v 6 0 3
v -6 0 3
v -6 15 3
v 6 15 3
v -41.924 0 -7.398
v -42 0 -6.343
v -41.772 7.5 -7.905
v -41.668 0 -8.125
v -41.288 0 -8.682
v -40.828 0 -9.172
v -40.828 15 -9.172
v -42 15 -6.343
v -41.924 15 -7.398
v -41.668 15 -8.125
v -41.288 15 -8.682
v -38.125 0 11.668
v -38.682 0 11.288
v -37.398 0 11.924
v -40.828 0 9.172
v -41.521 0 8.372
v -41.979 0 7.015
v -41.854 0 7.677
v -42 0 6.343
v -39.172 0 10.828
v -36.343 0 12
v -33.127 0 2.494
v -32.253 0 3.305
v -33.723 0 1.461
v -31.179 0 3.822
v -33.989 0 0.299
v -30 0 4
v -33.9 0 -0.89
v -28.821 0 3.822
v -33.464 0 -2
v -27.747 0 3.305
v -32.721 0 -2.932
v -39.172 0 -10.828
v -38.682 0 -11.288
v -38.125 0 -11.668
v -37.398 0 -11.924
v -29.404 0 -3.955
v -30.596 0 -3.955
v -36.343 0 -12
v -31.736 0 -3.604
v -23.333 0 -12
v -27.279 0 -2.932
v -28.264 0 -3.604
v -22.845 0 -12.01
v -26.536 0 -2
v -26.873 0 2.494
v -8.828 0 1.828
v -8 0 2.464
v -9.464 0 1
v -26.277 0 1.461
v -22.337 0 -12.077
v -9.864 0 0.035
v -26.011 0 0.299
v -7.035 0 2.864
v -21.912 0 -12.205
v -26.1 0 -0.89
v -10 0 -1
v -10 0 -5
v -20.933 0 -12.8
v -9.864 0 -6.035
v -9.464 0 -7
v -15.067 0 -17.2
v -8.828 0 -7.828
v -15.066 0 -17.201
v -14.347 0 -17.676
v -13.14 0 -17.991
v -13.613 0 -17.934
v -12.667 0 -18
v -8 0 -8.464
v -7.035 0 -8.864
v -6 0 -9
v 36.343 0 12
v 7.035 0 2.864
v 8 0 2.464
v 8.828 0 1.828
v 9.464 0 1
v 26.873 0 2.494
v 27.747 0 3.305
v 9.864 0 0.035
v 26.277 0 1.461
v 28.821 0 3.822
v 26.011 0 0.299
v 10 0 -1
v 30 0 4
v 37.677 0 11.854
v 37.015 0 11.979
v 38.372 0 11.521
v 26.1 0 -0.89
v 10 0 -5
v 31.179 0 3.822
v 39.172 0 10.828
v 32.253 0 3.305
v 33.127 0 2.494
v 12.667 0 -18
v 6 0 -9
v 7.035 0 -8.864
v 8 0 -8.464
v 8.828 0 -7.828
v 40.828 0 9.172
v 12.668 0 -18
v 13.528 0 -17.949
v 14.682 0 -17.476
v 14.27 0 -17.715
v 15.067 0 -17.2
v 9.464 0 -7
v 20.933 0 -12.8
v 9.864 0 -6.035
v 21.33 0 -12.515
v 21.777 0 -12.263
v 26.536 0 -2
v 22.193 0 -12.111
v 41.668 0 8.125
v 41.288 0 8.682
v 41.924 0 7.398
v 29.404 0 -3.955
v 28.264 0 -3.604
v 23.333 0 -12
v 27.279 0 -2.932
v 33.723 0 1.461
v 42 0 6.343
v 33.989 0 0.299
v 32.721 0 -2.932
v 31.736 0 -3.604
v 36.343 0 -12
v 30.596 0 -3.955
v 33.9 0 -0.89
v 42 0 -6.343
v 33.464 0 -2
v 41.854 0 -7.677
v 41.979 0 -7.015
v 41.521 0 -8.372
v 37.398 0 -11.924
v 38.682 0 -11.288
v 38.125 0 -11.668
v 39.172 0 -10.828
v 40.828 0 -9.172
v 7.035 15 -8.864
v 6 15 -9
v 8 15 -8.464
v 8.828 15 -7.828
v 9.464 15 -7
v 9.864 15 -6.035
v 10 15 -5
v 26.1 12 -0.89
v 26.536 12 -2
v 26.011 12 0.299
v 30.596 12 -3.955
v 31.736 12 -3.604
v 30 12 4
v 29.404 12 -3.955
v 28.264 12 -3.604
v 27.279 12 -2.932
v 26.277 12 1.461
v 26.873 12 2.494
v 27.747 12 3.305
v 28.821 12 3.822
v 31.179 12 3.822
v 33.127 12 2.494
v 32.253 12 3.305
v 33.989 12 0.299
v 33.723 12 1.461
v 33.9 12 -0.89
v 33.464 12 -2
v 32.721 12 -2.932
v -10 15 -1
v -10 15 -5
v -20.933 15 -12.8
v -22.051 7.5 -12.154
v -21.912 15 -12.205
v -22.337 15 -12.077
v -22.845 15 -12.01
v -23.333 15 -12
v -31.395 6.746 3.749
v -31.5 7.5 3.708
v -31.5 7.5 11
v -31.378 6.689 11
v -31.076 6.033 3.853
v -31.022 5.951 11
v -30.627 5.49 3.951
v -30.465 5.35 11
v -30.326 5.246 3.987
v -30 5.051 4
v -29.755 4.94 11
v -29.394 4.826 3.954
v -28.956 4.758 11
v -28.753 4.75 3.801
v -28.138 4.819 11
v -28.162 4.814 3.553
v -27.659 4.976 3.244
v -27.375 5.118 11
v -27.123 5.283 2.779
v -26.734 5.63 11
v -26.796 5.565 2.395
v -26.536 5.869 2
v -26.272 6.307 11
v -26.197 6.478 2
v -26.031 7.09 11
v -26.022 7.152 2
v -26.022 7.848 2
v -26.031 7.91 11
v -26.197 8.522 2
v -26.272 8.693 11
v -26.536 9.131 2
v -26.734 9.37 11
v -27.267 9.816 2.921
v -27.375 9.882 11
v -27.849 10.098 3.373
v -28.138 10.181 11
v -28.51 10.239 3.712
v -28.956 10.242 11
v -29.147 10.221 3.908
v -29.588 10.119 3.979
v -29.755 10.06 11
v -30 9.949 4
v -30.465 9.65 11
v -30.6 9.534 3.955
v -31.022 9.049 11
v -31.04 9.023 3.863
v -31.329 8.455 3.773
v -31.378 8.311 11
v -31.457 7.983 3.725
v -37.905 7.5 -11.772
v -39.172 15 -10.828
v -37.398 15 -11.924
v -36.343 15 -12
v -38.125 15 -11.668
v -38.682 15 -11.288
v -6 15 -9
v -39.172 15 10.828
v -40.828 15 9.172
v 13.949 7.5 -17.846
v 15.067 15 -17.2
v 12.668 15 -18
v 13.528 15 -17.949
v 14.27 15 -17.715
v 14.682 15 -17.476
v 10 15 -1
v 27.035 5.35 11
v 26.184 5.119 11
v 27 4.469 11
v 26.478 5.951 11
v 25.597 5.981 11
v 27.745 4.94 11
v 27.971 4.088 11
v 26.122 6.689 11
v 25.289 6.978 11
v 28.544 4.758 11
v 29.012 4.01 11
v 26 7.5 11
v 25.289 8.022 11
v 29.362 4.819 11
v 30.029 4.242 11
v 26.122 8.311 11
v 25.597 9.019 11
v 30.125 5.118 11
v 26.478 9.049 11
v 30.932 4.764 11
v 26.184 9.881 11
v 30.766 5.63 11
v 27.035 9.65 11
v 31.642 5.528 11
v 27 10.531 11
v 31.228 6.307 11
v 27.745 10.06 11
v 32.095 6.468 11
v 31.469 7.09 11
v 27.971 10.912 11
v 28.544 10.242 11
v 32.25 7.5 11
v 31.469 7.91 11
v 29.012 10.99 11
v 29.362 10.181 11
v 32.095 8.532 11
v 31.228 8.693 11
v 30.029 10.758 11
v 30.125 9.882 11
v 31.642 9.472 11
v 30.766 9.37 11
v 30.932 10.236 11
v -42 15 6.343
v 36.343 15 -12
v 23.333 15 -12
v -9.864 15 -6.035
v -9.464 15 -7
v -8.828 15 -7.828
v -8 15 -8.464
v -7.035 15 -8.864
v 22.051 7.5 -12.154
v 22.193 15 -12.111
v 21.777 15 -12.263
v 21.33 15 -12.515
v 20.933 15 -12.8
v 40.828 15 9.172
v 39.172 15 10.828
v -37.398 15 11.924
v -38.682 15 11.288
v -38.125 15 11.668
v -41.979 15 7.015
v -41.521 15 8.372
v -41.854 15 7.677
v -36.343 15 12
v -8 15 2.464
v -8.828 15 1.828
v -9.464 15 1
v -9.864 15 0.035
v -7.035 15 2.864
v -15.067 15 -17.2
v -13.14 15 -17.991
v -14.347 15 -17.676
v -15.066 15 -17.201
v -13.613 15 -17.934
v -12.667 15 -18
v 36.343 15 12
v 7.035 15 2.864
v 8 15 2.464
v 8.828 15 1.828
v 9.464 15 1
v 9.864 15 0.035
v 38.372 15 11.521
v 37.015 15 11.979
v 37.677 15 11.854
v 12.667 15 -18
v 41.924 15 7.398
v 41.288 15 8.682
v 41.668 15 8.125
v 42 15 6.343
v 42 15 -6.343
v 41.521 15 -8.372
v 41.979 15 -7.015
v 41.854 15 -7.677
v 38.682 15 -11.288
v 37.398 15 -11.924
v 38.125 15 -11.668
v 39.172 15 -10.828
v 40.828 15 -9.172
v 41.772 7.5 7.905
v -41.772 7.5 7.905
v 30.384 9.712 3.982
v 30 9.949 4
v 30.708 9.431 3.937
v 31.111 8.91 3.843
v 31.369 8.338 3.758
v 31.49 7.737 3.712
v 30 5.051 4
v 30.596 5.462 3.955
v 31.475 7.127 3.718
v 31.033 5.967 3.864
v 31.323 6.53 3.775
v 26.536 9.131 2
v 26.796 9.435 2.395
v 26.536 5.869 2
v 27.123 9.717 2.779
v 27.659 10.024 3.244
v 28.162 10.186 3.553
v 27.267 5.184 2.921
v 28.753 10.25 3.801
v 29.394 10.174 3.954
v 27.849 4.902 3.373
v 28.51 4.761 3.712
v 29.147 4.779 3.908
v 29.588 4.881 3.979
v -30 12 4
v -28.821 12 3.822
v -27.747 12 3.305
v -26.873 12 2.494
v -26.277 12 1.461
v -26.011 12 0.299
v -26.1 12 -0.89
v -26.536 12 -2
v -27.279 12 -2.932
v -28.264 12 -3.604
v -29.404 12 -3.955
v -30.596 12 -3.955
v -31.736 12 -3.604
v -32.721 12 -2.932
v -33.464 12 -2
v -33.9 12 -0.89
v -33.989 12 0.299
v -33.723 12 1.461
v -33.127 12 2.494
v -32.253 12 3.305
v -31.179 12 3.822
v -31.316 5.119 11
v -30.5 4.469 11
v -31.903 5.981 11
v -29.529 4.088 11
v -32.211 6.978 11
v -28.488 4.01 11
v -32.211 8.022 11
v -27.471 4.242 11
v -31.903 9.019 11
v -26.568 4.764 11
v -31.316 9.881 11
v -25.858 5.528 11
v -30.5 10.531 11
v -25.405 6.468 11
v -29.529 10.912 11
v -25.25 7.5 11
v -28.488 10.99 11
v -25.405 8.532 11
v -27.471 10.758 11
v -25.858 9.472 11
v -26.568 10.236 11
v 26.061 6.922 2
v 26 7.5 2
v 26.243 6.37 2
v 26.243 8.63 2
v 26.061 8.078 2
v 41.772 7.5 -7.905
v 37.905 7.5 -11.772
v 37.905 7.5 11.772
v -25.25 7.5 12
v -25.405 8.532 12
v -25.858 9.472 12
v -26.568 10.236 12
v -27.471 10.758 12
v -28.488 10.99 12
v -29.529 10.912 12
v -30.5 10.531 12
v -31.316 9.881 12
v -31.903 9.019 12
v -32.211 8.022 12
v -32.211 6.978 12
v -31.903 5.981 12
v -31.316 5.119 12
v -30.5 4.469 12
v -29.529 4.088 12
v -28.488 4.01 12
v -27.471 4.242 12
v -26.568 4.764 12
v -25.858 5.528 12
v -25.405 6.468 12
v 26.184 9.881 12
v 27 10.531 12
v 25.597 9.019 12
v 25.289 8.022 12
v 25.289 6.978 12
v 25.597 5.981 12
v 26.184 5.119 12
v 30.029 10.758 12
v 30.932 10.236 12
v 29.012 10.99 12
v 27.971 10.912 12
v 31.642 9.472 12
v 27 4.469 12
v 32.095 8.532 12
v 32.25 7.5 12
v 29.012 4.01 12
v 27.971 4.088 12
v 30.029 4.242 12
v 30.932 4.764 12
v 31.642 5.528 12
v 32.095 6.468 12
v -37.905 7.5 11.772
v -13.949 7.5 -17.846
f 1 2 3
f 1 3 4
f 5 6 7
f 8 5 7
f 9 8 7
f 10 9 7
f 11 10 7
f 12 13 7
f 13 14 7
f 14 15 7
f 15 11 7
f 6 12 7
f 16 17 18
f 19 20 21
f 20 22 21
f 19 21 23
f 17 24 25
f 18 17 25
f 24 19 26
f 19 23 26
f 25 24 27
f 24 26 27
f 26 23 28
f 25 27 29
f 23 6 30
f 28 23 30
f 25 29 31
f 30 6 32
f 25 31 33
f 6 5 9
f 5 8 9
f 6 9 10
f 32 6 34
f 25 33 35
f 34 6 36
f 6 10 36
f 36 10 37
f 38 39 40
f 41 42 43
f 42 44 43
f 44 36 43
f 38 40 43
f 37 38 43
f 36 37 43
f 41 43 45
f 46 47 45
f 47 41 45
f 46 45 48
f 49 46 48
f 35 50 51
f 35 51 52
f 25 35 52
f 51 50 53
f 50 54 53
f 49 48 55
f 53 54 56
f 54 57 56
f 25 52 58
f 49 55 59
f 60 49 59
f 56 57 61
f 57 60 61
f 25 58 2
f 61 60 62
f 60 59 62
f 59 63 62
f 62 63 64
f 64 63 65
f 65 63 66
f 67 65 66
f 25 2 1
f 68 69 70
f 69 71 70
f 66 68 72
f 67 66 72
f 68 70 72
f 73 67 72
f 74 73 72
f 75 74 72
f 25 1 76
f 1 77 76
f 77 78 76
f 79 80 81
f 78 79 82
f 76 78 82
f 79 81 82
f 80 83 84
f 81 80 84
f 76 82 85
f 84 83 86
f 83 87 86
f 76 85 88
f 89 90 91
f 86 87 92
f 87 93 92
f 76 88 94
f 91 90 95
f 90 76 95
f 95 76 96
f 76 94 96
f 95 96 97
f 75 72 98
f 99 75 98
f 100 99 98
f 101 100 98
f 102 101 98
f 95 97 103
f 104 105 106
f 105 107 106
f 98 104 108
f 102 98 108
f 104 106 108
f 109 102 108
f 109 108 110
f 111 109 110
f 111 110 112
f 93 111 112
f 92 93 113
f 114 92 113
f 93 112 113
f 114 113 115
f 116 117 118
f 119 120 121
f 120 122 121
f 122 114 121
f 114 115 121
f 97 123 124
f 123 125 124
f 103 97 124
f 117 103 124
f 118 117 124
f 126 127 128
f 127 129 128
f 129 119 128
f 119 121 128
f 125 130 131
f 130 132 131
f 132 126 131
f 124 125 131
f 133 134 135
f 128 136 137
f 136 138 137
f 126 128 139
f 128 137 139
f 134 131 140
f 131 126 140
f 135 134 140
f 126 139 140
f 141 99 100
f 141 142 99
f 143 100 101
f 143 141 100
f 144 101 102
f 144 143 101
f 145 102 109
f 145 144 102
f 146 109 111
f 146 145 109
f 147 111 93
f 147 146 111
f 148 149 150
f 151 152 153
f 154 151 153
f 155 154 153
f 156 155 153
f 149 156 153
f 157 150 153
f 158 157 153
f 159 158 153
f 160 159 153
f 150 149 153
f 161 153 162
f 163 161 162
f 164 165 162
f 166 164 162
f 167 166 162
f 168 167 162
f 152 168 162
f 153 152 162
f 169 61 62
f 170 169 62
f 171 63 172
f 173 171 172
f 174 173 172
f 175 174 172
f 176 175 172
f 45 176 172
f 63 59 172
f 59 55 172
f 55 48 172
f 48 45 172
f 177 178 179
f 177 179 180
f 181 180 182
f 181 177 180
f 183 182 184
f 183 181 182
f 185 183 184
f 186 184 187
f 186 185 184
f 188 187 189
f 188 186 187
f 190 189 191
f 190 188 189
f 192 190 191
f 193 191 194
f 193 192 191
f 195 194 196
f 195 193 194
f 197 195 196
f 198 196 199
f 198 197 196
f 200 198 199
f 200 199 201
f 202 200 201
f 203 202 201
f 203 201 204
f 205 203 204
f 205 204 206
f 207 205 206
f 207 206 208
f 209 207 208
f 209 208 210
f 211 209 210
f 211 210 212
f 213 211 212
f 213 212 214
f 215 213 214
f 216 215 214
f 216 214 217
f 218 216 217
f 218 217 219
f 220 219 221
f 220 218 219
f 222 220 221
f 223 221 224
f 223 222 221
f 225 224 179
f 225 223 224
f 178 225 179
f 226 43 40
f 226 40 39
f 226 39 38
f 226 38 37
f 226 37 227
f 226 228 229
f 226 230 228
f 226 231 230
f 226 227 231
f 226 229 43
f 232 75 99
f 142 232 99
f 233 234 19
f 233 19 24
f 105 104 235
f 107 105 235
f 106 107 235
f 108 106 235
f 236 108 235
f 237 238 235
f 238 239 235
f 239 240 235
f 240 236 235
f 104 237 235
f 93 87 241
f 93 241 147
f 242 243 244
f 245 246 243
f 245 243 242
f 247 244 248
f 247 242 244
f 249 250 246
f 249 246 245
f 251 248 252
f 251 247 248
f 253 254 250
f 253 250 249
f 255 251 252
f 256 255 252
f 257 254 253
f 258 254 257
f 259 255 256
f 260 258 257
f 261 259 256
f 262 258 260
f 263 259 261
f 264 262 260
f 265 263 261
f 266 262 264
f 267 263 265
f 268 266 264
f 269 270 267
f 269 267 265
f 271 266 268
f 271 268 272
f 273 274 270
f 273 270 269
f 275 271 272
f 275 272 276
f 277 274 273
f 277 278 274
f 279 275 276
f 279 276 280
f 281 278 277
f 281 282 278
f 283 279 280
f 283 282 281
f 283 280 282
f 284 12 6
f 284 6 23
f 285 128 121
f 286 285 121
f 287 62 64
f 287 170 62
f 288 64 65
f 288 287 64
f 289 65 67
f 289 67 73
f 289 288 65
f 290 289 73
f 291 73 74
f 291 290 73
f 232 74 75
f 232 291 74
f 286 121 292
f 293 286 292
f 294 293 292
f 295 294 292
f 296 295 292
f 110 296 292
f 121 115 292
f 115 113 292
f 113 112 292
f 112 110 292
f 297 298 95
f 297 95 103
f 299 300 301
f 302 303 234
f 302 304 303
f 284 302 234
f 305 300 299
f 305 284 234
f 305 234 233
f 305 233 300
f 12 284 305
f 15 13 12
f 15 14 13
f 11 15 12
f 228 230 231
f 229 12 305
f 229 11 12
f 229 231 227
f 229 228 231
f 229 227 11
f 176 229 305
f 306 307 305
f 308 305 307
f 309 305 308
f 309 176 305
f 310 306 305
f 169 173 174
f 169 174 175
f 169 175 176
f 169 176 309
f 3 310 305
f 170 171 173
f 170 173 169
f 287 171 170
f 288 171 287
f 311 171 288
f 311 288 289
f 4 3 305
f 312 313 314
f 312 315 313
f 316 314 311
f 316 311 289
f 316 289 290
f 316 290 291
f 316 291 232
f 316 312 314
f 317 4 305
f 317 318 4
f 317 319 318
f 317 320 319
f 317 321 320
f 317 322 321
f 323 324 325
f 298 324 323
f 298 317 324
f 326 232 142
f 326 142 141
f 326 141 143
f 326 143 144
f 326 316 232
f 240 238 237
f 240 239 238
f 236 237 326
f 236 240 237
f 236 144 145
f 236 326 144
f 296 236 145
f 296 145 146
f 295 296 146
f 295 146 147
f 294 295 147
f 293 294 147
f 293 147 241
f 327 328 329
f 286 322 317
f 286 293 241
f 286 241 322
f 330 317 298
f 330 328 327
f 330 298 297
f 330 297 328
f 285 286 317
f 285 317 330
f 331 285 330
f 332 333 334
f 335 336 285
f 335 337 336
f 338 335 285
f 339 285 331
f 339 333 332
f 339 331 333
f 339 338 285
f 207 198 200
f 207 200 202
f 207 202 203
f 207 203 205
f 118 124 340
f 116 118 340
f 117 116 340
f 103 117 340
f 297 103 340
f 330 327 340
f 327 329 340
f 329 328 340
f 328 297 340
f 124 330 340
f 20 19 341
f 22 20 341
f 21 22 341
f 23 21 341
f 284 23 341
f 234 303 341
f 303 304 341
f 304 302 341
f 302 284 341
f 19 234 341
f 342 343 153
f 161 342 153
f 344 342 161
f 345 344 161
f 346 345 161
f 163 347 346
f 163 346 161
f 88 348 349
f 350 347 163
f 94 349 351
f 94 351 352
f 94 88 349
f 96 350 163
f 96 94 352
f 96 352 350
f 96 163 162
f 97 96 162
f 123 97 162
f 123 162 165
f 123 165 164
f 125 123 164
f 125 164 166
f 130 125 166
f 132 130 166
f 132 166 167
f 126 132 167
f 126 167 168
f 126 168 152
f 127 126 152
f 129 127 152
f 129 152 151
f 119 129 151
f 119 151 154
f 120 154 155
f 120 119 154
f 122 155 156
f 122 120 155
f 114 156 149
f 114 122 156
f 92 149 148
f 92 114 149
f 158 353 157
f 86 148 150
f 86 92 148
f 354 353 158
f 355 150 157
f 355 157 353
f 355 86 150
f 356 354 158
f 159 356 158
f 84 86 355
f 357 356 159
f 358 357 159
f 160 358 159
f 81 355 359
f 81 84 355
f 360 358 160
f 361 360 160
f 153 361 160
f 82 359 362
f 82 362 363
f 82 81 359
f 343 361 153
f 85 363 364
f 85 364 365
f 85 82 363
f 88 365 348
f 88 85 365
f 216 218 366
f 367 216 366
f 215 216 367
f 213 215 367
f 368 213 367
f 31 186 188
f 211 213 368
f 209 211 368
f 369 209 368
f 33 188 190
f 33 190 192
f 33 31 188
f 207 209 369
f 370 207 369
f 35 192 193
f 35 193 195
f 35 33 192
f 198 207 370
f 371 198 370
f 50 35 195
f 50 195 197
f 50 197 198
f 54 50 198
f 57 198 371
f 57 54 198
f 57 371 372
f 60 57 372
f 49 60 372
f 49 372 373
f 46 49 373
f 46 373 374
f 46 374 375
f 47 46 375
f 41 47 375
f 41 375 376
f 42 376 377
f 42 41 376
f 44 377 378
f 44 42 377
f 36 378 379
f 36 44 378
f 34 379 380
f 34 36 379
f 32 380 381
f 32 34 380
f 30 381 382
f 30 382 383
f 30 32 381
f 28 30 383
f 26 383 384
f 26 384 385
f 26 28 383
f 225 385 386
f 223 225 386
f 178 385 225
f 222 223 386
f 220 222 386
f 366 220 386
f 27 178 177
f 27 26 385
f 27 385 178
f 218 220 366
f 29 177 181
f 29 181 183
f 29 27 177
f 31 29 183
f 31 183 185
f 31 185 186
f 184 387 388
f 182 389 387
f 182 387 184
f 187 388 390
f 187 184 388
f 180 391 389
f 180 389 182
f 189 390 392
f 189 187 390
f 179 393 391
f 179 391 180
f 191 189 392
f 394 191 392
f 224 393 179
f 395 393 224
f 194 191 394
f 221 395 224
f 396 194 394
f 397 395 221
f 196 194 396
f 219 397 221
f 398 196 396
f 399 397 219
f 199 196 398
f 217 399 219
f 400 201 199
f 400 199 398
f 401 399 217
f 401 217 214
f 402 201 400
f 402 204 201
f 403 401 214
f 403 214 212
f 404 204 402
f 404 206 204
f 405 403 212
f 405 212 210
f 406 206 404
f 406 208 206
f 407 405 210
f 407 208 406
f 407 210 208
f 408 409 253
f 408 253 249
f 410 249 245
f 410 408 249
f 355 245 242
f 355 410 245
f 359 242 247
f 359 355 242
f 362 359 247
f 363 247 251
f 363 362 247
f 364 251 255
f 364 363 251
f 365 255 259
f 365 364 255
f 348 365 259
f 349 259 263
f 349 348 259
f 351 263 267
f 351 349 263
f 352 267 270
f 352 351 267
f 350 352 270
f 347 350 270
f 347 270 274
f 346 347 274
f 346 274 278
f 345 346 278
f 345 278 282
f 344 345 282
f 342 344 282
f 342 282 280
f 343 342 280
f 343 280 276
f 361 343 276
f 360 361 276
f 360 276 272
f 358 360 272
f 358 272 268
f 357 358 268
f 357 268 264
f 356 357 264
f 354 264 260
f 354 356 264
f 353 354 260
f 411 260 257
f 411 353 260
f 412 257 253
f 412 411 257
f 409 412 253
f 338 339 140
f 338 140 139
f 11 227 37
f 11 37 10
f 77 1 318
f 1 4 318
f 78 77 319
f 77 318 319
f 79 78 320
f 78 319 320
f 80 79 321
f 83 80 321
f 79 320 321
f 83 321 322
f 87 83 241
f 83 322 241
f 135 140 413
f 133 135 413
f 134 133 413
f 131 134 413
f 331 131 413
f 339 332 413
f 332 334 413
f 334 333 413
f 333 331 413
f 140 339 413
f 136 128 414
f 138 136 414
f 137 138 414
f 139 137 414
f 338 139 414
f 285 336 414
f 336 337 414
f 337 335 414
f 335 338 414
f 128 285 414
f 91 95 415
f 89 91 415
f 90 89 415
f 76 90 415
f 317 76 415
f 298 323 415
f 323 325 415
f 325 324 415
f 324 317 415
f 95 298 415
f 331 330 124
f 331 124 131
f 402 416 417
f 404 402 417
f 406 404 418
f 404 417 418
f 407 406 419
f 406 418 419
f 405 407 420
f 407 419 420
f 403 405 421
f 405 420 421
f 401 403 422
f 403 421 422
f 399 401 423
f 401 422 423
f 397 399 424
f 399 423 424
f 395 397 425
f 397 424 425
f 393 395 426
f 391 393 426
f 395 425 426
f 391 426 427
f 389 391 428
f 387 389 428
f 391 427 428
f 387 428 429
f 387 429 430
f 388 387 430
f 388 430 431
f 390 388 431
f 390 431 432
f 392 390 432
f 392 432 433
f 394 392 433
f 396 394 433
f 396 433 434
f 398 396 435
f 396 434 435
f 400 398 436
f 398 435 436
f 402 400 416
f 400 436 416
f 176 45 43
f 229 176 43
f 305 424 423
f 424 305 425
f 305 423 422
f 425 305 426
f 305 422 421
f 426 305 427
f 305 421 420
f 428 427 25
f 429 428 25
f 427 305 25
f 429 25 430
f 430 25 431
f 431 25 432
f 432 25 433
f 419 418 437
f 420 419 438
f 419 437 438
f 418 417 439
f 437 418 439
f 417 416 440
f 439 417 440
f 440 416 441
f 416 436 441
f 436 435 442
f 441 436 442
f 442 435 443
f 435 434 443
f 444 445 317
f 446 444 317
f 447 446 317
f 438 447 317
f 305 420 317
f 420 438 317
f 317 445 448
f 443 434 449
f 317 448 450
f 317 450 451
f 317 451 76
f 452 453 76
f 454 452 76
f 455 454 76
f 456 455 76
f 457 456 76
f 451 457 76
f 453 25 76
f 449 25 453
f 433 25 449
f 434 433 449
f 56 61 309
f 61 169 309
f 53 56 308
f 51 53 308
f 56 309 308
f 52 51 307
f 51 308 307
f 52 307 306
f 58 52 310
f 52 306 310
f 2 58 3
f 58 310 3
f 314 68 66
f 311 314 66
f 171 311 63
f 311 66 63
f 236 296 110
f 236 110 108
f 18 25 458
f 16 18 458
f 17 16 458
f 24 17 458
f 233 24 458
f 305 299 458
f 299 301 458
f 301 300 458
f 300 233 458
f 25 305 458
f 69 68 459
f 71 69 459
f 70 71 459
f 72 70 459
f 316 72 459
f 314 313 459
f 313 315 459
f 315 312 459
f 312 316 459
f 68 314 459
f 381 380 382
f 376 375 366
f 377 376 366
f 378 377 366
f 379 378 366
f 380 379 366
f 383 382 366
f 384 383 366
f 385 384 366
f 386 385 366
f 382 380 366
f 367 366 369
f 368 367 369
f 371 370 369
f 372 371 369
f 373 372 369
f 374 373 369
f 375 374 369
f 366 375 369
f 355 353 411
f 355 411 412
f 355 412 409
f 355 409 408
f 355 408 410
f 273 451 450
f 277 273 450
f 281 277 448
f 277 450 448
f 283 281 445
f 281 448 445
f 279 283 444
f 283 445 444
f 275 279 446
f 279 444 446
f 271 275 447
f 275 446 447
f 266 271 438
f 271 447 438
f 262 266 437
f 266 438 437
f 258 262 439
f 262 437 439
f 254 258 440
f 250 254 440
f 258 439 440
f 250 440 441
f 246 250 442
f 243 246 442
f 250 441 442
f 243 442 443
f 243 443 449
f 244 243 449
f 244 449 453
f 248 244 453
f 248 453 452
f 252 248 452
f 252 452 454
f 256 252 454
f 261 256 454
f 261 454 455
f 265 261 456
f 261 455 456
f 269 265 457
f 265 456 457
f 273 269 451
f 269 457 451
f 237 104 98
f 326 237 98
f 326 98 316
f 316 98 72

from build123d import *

# Parameters (mm, degrees)
ESQUISSE1_W                  = 20
ESQUISSE1_H                  = 12
BOSS_EXTRU_1_DEPTH           = 15
ESQUISSE1_4_R                = 4
ENL_V_MAT_EXTRU_1_DEPTH      = 12
CONG_2_R                     = 4
ENL_V_MAT_EXTRU_2_DEPTH      = 54.749418763
ENL_V_MAT_EXTRU_2_DEPTH_BACK = 10
ESQUISSE2_R                  = 2.75
ESQUISSE4_R                  = 3.5
ENL_V_MAT_EXTRU_3_DEPTH      = 1
ESQUISSE5_R                  = 3.5
ENL_V_MAT_EXTRU_4_DEPTH      = 1


with BuildPart() as part:
    # Esquisse1 → Boss.-Extru.1 (new body)
    with BuildSketch(Plane(origin=(0, 0, 0), x_dir=(1, 0, 0), z_dir=(0, 1, 0))):
        Polygon((-38, 12), (-42, 8), (-42, -8), (-38, -12), (38, -12), (42, -8), (42, 8), (38, 12), (22, 12), (14, 18), (-14, 18), (-22, 12), align=None)
        with Locations((0, 3)):
            Rectangle(ESQUISSE1_W, ESQUISSE1_H, mode=Mode.SUBTRACT)
    extrude(amount=BOSS_EXTRU_1_DEPTH)

    # Congé1
    # a fillet whose section is not a circle: 4 mm, written as the material it adds along each edge
    with BuildSketch(Plane(origin=(22, 0, -12), x_dir=(1, 0, 0), z_dir=(0, 1, 0)), Plane(origin=(-22, 0, -12), x_dir=(0.7999999999999996, 0, -0.6000000000000003), z_dir=(0, 1, 0))) as cong_1_piece_1:
        with BuildLine():
            add(Edge.make_bspline([(1.333333333, 0), (1.087283439, 0), (0.841233545, 0), (0.292751215, 0.037020099), (-0.211988912, 0.205266808), (-0.672986836, 0.504740127), (-0.869826751, 0.652370064), (-1.066666667, 0.8)], knots=[0, 0, 0, 0, 0, 0, 0.5, 0.5, 1, 1, 1, 1, 1, 1], degree=5))
            Line((-1.066666667, 0.8), (0, 0))
            Line((0, 0), (1.333333333, 0))
        make_face()
    extrude(amount=15)
    # a fillet whose section is not a circle: 4 mm, written as the material it takes off along each edge
    with BuildSketch(Plane(origin=(42, -4.142135624, 8), x_dir=(-0.707106781186547, 0, 0.7071067811865481), z_dir=(0, 1, 0)), Plane(origin=(38, -4.142135624, 12), x_dir=(-1, 0, 0), z_dir=(0, 1, 0)), Plane(origin=(42, -4.142135624, -8), x_dir=(0, 0, 1), z_dir=(0, 1, 0)), Plane(origin=(38, -4.142135624, -12), x_dir=(0.7071067811865481, 0, 0.707106781186547), z_dir=(0, 1, 0)), Plane(origin=(-42, -4.142135624, -8), x_dir=(0.7071067811865475, 0, -0.7071067811865475), z_dir=(0, 1, 0)), Plane(origin=(-42, -4.142135624, 8), x_dir=(0, 0, -1), z_dir=(0, 1, 0)), Plane(origin=(-38, -4.142135624, 12), x_dir=(-0.7071067811865465, 0, -0.7071067811865486), z_dir=(0, 1, 0))) as cong_1_2_piece_1:
        with BuildLine():
            add(Edge.make_bspline([(1.656854249, 0), (1.35356905, 0), (1.050283851, 0), (0.373674798, -0.056927592), (-0.223974097, -0.30448187), (-0.742662833, -0.742662833), (-0.957117854, -0.957117854), (-1.171572875, -1.171572875)], knots=[0, 0, 0, 0, 0, 0, 0.5, 0.5, 1, 1, 1, 1, 1, 1], degree=5))
            Line((-1.171572875, -1.171572875), (0, 0))
            Line((0, 0), (1.656854249, 0))
        make_face()
    extrude(amount=23.284271247, mode=Mode.SUBTRACT)
    with BuildSketch(Plane(origin=(14, -3.333333333, -18), x_dir=(0.7999999999999996, 0, 0.6000000000000003), z_dir=(0, 1, 0)), Plane(origin=(-14, -3.333333333, -18), x_dir=(1, 0, 0), z_dir=(0, 1, 0))) as cong_1_2_piece_2:
        with BuildLine():
            add(Edge.make_bspline([(1.333333333, 0), (1.087283439, 0), (0.841233545, 0), (0.292751215, -0.037020099), (-0.211988912, -0.205266808), (-0.672986836, -0.504740127), (-0.869826751, -0.652370064), (-1.066666667, -0.8)], knots=[0, 0, 0, 0, 0, 0, 0.5, 0.5, 1, 1, 1, 1, 1, 1], degree=5))
            Line((-1.066666667, -0.8), (0, 0))
            Line((0, 0), (1.333333333, 0))
        make_face()
    extrude(amount=21.666666667, mode=Mode.SUBTRACT)
    with BuildSketch(Plane(origin=(-38, -4.142135624, -12), x_dir=(-0.7071067811865465, 0, 0.7071067811865486), z_dir=(0, 1, 0))) as cong_1_2_piece_3:
        with BuildLine():
            add(Edge.make_bspline([(1.656854249, 0), (1.35356905, 0), (1.050283851, 0), (0.373674798, 0.056927592), (-0.223974097, 0.30448187), (-0.742662833, 0.742662833), (-0.957117854, 0.957117854), (-1.171572875, 1.171572875)], knots=[0, 0, 0, 0, 0, 0, 0.5, 0.5, 1, 1, 1, 1, 1, 1], degree=5))
            Line((-1.171572875, 1.171572875), (0, 0))
            Line((0, 0), (1.656854249, 0))
        make_face()
    extrude(amount=23.284271247, mode=Mode.SUBTRACT)

    # Esquisse1<4> → Enlèv. mat.-Extru.1 (cut)
    with BuildSketch(Plane(origin=(0, 0, 0), x_dir=(1, 0, 0), z_dir=(0, 1, 0))):
        with Locations(Location((-30, 0, 0), (0, 0, 270))):
            Circle(ESQUISSE1_4_R)
        with Locations(Location((30, 0, 0), (0, 0, 270))):
            Circle(ESQUISSE1_4_R)
    extrude(amount=ENL_V_MAT_EXTRU_1_DEPTH, mode=Mode.SUBTRACT)

    # Congé2
    cong_2_edges = [part.edges().sort_by_distance(p)[0] for p in [
        (-10, 7.5, -9),
        (-10, 7.5, 3),
        (10, 7.5, 3),
        (10, 7.5, -9),
    ]]
    fillet(cong_2_edges, radius=CONG_2_R)

    # Esquisse2 → Enlèv. mat.-Extru.2 (cut, two sides: drawn at the far end of the back side and taken through both)
    with BuildSketch(Plane.XY.offset(12).offset(-ENL_V_MAT_EXTRU_2_DEPTH_BACK)):
        with Locations(Location((-28.75, 7.5, 0), (0, 0, 180))):
            Circle(ESQUISSE2_R)
        with Locations(Location((28.75, 7.5, 0), (0, 0, 180))):
            Circle(ESQUISSE2_R)
    extrude(amount=ENL_V_MAT_EXTRU_2_DEPTH + ENL_V_MAT_EXTRU_2_DEPTH_BACK, mode=Mode.SUBTRACT)

    # Esquisse4 → Enlèv. mat.-Extru.3 (cut)
    with BuildSketch(Plane.XY.offset(12)):
        with Locations((28.75, 7.5)):
            Circle(ESQUISSE4_R)
    extrude(amount=-ENL_V_MAT_EXTRU_3_DEPTH, mode=Mode.SUBTRACT)

    # Esquisse5 → Enlèv. mat.-Extru.4 (cut)
    with BuildSketch(Plane.XY.offset(12)):
        with Locations((-28.75, 7.5)):
            Circle(ESQUISSE5_R)
    extrude(amount=-ENL_V_MAT_EXTRU_4_DEPTH, mode=Mode.SUBTRACT)


solid = part.part
